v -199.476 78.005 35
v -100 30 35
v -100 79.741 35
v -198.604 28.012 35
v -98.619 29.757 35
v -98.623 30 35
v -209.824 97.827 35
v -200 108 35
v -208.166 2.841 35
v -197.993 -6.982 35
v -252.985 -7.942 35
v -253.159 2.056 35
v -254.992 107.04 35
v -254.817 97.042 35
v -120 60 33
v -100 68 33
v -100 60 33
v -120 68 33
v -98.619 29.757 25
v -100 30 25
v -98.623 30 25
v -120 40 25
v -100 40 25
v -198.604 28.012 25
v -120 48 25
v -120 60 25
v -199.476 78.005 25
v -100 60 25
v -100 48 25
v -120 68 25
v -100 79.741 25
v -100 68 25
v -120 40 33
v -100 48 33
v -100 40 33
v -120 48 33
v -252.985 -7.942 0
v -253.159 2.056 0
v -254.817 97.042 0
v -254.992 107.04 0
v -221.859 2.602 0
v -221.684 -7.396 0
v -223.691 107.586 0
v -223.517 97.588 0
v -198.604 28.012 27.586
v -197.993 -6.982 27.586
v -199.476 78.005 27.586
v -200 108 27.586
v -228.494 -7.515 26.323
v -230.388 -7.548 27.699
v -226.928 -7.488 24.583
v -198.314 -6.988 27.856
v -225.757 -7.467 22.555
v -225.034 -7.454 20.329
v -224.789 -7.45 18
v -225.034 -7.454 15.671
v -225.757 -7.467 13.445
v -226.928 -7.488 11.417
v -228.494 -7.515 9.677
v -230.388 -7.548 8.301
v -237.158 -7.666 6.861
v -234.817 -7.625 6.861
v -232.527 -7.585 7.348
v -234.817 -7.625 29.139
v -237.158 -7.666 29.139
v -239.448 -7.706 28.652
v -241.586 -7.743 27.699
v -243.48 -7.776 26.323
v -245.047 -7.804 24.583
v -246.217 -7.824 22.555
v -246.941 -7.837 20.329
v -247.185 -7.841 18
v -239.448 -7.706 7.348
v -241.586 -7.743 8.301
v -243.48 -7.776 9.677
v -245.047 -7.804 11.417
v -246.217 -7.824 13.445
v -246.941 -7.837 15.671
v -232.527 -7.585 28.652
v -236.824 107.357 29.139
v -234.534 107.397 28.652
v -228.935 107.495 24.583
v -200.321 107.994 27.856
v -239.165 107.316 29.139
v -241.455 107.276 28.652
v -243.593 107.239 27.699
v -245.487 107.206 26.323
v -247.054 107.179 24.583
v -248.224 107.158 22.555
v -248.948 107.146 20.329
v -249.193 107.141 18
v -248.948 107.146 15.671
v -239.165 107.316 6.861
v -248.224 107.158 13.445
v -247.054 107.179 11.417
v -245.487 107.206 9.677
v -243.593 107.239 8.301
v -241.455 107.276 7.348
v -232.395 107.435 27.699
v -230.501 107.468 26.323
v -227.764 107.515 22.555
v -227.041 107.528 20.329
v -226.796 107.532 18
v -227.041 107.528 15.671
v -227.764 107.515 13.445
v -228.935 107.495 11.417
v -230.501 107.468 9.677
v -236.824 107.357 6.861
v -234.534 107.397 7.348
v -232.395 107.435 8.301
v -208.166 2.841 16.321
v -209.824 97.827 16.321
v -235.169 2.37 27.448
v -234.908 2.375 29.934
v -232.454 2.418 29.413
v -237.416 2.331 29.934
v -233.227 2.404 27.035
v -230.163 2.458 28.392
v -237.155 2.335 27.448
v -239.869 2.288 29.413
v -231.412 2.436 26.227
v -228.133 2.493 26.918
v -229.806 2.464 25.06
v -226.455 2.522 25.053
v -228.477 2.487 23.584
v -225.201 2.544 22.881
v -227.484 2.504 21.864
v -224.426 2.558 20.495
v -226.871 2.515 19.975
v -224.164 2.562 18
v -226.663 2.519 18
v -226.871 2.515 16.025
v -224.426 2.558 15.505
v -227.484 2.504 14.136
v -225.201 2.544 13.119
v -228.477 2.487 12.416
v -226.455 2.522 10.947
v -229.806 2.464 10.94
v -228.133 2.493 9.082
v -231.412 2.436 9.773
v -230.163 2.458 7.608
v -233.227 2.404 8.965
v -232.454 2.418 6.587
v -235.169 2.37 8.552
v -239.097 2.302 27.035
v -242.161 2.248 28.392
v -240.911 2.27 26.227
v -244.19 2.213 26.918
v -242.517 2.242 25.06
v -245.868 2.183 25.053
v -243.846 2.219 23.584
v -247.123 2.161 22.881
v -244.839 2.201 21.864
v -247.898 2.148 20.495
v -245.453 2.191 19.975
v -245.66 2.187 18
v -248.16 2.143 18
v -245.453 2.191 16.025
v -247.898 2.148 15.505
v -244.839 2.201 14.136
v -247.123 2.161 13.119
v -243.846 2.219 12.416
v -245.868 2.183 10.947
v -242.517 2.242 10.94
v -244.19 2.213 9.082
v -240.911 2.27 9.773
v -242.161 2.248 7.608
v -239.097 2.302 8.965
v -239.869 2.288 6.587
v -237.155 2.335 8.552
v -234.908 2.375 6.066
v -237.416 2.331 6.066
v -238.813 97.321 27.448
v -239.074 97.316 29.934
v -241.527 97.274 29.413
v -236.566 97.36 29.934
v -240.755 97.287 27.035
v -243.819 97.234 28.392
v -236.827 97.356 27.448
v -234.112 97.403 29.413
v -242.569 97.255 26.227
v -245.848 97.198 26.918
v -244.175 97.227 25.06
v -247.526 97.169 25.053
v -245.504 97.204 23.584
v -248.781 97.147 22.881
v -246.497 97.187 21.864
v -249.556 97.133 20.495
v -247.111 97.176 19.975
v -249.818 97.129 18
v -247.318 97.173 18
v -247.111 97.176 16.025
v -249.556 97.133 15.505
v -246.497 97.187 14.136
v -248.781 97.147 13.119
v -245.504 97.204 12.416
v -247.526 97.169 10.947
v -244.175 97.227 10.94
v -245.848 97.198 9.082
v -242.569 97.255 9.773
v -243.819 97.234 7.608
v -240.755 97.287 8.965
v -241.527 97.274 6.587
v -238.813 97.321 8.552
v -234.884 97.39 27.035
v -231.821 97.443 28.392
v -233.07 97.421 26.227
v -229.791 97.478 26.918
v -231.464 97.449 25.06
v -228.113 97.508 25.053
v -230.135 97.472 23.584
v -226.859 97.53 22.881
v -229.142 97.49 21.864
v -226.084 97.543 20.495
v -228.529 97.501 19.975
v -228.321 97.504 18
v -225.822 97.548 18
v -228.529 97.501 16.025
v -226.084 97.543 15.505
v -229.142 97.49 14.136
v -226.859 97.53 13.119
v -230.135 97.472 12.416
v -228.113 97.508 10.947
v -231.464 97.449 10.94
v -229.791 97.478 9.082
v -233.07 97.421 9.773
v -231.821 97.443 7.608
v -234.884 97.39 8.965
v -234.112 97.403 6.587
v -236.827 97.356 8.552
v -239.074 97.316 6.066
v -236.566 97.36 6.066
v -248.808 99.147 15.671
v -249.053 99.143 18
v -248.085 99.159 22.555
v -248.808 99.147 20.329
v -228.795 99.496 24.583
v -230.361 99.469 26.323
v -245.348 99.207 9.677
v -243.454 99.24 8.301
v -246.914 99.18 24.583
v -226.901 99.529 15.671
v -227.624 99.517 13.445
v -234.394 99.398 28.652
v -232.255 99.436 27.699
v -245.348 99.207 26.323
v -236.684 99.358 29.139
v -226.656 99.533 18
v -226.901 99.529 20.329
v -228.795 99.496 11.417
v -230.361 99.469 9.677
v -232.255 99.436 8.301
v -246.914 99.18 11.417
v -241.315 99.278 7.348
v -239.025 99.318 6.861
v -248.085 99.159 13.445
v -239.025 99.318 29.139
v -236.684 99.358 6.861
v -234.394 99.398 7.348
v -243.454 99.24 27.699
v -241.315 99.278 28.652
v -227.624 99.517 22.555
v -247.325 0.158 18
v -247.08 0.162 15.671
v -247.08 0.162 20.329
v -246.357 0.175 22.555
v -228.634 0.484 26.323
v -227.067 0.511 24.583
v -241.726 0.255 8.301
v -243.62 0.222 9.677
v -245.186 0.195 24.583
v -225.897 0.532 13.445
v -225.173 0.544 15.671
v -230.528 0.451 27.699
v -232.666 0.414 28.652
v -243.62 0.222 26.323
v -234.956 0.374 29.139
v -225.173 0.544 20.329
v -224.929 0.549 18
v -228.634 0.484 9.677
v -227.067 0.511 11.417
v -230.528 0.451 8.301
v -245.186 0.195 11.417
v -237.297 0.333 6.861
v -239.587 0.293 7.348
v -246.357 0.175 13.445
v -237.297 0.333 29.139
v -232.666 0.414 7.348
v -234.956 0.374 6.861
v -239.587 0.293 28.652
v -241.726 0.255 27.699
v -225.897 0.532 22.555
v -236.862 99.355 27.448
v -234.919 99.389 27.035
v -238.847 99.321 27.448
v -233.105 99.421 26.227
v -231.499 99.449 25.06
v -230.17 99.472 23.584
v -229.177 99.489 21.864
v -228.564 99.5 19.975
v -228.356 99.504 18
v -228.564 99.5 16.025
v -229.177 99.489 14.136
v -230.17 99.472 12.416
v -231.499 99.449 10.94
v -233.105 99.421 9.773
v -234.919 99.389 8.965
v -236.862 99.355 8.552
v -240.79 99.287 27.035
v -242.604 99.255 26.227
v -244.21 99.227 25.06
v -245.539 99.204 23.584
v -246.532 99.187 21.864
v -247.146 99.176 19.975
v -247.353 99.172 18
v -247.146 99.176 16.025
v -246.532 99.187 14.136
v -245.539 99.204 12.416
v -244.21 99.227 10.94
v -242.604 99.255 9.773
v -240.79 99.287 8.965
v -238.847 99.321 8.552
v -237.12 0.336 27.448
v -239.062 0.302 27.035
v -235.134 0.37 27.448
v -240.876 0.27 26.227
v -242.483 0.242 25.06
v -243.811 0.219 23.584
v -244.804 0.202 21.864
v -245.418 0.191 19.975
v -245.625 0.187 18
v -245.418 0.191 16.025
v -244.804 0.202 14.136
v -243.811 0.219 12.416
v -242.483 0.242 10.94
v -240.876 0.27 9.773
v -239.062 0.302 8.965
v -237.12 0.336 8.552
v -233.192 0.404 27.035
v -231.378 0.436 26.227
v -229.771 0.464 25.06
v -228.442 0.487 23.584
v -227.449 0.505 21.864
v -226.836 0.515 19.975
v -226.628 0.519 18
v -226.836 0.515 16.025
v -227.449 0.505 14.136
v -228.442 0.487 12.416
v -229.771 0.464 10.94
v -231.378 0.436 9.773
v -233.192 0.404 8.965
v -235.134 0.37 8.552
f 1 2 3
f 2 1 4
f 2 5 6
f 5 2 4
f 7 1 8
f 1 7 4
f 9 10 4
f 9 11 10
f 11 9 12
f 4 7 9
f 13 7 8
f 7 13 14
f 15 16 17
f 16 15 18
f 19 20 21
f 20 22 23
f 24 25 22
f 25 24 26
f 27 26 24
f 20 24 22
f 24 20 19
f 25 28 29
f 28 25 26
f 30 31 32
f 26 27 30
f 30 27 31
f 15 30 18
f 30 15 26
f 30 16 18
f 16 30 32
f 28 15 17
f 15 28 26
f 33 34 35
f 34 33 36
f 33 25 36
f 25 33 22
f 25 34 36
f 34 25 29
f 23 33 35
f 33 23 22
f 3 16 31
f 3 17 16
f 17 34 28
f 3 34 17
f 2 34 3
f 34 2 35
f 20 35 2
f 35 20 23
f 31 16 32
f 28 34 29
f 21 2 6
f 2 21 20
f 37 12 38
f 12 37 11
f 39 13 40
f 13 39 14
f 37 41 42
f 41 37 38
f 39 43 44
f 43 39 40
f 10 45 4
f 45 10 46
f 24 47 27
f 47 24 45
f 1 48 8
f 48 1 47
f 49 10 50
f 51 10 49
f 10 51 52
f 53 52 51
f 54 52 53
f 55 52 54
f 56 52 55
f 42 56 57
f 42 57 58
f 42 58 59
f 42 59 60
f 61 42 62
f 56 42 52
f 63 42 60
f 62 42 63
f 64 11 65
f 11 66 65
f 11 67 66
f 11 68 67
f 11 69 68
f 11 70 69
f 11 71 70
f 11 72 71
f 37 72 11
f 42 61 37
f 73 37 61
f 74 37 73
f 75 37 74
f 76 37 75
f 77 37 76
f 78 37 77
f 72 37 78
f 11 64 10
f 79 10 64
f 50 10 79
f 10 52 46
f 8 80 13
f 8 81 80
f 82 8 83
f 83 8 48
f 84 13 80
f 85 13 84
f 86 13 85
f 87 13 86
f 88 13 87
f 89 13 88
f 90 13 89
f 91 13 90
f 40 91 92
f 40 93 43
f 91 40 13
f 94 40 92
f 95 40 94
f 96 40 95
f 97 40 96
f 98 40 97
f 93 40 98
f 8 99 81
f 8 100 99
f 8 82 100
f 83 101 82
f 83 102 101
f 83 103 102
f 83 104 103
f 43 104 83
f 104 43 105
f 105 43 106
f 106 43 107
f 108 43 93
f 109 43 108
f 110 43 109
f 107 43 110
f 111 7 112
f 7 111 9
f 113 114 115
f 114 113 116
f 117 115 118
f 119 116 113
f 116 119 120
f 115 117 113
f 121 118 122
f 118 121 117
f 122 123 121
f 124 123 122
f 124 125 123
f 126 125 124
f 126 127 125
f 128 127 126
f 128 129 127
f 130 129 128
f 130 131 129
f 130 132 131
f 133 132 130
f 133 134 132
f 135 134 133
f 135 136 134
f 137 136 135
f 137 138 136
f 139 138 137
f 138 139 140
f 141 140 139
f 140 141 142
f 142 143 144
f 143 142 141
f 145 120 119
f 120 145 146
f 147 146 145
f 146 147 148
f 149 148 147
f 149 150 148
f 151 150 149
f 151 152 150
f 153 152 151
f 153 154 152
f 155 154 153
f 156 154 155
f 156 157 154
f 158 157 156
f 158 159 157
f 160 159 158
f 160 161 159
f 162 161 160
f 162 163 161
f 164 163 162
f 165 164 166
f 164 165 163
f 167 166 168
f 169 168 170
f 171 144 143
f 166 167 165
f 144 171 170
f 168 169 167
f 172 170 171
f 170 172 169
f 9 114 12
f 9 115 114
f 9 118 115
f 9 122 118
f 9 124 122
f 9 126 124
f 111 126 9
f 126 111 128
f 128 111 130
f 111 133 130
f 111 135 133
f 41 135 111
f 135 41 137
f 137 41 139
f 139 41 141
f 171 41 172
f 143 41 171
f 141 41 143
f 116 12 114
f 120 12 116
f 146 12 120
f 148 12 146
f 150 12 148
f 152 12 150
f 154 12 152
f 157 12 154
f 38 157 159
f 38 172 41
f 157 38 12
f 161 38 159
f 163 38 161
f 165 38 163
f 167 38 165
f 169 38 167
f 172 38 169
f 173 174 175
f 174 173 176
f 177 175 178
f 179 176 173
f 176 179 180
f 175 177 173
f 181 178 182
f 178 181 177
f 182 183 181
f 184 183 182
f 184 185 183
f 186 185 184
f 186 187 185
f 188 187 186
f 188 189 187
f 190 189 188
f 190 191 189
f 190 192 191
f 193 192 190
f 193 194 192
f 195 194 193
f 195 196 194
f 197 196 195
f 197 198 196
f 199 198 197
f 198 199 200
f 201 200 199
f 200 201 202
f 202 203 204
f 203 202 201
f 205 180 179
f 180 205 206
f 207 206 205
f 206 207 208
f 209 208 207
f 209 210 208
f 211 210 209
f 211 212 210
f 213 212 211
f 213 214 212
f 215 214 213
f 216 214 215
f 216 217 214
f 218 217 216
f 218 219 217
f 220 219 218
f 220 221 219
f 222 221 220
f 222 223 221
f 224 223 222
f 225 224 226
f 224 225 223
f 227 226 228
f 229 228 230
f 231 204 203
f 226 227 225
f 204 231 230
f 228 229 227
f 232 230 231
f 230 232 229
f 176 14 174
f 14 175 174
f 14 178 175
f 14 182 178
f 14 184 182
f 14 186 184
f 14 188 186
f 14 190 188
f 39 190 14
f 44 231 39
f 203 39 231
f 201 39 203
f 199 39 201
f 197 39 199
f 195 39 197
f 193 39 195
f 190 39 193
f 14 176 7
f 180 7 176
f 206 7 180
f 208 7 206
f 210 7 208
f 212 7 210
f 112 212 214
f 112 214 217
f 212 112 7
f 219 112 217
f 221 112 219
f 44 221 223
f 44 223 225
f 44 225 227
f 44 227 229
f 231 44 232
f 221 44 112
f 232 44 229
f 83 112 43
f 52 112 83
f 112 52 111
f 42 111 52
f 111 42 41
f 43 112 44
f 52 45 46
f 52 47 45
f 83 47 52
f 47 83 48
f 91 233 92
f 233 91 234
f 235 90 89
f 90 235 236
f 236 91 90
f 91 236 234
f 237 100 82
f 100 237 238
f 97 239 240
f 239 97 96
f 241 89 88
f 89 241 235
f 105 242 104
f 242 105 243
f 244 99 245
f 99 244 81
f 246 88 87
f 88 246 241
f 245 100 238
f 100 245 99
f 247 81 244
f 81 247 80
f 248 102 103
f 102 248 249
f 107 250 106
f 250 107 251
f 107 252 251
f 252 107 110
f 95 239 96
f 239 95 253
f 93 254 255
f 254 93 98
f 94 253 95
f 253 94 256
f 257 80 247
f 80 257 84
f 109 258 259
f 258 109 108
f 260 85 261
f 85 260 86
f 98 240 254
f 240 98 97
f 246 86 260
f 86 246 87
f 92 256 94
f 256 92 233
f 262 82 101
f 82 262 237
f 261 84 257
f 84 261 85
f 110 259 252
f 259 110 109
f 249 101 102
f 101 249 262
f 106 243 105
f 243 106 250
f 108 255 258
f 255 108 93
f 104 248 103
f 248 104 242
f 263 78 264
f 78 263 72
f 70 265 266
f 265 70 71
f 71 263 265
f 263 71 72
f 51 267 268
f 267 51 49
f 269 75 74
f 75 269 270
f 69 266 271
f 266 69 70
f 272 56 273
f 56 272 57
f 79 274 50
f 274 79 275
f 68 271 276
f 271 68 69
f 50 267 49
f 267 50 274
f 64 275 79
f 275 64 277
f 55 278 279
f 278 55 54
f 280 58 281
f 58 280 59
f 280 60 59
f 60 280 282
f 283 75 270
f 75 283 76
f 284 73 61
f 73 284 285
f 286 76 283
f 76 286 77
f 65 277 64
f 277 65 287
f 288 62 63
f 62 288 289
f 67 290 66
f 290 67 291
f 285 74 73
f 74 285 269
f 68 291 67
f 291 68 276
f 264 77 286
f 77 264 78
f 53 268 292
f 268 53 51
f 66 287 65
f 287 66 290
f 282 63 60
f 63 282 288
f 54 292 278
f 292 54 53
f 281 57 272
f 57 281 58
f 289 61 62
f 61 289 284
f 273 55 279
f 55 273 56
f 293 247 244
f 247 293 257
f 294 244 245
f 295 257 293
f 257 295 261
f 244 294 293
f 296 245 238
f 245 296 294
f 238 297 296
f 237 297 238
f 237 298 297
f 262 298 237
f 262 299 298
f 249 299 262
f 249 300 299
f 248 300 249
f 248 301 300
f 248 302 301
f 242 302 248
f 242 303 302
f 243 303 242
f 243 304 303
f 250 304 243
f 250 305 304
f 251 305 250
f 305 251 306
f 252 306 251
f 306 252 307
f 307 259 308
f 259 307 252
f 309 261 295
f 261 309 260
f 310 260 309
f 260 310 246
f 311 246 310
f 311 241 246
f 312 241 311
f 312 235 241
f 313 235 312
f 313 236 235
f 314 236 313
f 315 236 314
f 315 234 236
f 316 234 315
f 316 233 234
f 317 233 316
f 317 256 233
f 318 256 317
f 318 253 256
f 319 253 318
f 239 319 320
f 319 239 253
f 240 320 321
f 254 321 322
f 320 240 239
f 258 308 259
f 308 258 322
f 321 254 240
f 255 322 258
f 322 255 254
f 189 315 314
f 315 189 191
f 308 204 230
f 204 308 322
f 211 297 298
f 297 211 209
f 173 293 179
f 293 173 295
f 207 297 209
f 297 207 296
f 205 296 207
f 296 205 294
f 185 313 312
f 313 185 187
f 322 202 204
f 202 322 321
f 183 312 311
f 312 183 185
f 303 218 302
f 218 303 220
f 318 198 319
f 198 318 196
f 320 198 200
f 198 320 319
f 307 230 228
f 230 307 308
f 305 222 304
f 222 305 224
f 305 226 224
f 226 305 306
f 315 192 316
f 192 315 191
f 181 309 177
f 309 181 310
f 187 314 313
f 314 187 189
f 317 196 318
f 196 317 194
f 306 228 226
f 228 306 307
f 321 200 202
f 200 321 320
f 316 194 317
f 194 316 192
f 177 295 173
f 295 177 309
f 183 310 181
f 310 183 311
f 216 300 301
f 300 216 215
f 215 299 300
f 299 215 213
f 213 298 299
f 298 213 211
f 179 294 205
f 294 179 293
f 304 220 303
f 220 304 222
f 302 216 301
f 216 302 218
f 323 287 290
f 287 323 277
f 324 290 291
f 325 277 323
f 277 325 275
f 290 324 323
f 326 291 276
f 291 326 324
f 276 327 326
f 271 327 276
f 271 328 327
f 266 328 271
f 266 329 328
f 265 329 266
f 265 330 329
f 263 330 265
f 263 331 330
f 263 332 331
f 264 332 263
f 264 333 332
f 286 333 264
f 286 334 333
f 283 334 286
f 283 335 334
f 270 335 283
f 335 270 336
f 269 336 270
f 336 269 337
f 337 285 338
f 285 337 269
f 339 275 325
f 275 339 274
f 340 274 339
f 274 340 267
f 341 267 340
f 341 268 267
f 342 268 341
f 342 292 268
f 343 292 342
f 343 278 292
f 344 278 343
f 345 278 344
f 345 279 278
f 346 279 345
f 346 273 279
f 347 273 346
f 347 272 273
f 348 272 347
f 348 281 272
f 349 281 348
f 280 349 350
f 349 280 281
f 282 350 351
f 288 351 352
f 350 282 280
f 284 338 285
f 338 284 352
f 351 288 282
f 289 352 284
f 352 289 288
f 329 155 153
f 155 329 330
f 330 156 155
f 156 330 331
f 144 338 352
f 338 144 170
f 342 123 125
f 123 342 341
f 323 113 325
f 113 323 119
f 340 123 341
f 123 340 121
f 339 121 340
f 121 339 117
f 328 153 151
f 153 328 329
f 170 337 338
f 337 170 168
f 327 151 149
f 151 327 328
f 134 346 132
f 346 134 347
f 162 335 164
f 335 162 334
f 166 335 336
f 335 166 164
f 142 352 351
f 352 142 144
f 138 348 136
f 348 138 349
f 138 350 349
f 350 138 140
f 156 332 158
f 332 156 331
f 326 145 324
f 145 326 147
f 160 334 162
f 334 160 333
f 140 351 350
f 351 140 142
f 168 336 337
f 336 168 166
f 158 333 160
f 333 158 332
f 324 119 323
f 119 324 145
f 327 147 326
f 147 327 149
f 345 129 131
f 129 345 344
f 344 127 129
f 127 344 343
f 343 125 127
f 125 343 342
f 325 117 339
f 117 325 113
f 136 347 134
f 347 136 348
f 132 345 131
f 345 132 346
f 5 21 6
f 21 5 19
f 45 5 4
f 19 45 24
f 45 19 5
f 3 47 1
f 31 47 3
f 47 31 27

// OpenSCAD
//Need: Holes the size of the bearings
//      Connector between car parts


//ScramblerFrontComplete();

module ScramblerFrontComplete(){
    ScramblerFrontBoard();
    translate([40,0,-50]){
    cube([15,10,50]);
    }
    translate([40,105,-50]){
    cube([15,10,50]);
    }
}


ScramblerBackBoard();

module  ScramblerBackBoard(){
    
    difference(){
    translate([-200,108,0]){
        rotate([0,0,181]){
            ScramblerFrontBoard();
            }
        }
        
   ScramblerFrontBoard();
    }
    
    }

module ScramblerFront()
{
    translate([-120,60,25])
    cube([30,8,8]);
    
    translate([-120,40,25])
        cube([30,8,8]);
    
    
    difference()
    {
        cube([55,115,35]);
        
        translate([10,10,20])
        cube([95,95,7]);
        translate([10,10,-2])
        cube(95,90,55);
        
        translate([-15,00,15]){
            rotate([0,50,0]){
                cube([100,120,20]);
            }
        }
    
        
        translate([38,11,18])
        rotate([90,0,0])
        cylinder(15,11.2,11.2);
        translate([38,116,18])
        rotate([90,0,0])
        cylinder(16,11.2,11.2);
    }
    
    difference()
    {
        translate([38,10,18])
        rotate([90,0,0])
        cylinder(2,12,12);
        
        translate([38,11,18])
        rotate([90,0,0])
        cylinder(9,9.5,9.5);
    }
    translate([0,97,0])
    {
    difference()
    {
        translate([38,10,18])
        rotate([90,0,0])
        cylinder(2,12,12);
        
        translate([38,11,18])
        rotate([90,0,0])
        cylinder(9,9.5,9.5);
    }
}
    
}
module ScramblerFrontBoard()
{
    ScramblerFront();
    translate([100,0,0])
{
    ScramblerBoard();
}
}

module ScramblerBoard()
{
    translate([-200,30,25])
    {
        cube([100,50,10]);
    }
}
// Bearing size: 22 in diameter
